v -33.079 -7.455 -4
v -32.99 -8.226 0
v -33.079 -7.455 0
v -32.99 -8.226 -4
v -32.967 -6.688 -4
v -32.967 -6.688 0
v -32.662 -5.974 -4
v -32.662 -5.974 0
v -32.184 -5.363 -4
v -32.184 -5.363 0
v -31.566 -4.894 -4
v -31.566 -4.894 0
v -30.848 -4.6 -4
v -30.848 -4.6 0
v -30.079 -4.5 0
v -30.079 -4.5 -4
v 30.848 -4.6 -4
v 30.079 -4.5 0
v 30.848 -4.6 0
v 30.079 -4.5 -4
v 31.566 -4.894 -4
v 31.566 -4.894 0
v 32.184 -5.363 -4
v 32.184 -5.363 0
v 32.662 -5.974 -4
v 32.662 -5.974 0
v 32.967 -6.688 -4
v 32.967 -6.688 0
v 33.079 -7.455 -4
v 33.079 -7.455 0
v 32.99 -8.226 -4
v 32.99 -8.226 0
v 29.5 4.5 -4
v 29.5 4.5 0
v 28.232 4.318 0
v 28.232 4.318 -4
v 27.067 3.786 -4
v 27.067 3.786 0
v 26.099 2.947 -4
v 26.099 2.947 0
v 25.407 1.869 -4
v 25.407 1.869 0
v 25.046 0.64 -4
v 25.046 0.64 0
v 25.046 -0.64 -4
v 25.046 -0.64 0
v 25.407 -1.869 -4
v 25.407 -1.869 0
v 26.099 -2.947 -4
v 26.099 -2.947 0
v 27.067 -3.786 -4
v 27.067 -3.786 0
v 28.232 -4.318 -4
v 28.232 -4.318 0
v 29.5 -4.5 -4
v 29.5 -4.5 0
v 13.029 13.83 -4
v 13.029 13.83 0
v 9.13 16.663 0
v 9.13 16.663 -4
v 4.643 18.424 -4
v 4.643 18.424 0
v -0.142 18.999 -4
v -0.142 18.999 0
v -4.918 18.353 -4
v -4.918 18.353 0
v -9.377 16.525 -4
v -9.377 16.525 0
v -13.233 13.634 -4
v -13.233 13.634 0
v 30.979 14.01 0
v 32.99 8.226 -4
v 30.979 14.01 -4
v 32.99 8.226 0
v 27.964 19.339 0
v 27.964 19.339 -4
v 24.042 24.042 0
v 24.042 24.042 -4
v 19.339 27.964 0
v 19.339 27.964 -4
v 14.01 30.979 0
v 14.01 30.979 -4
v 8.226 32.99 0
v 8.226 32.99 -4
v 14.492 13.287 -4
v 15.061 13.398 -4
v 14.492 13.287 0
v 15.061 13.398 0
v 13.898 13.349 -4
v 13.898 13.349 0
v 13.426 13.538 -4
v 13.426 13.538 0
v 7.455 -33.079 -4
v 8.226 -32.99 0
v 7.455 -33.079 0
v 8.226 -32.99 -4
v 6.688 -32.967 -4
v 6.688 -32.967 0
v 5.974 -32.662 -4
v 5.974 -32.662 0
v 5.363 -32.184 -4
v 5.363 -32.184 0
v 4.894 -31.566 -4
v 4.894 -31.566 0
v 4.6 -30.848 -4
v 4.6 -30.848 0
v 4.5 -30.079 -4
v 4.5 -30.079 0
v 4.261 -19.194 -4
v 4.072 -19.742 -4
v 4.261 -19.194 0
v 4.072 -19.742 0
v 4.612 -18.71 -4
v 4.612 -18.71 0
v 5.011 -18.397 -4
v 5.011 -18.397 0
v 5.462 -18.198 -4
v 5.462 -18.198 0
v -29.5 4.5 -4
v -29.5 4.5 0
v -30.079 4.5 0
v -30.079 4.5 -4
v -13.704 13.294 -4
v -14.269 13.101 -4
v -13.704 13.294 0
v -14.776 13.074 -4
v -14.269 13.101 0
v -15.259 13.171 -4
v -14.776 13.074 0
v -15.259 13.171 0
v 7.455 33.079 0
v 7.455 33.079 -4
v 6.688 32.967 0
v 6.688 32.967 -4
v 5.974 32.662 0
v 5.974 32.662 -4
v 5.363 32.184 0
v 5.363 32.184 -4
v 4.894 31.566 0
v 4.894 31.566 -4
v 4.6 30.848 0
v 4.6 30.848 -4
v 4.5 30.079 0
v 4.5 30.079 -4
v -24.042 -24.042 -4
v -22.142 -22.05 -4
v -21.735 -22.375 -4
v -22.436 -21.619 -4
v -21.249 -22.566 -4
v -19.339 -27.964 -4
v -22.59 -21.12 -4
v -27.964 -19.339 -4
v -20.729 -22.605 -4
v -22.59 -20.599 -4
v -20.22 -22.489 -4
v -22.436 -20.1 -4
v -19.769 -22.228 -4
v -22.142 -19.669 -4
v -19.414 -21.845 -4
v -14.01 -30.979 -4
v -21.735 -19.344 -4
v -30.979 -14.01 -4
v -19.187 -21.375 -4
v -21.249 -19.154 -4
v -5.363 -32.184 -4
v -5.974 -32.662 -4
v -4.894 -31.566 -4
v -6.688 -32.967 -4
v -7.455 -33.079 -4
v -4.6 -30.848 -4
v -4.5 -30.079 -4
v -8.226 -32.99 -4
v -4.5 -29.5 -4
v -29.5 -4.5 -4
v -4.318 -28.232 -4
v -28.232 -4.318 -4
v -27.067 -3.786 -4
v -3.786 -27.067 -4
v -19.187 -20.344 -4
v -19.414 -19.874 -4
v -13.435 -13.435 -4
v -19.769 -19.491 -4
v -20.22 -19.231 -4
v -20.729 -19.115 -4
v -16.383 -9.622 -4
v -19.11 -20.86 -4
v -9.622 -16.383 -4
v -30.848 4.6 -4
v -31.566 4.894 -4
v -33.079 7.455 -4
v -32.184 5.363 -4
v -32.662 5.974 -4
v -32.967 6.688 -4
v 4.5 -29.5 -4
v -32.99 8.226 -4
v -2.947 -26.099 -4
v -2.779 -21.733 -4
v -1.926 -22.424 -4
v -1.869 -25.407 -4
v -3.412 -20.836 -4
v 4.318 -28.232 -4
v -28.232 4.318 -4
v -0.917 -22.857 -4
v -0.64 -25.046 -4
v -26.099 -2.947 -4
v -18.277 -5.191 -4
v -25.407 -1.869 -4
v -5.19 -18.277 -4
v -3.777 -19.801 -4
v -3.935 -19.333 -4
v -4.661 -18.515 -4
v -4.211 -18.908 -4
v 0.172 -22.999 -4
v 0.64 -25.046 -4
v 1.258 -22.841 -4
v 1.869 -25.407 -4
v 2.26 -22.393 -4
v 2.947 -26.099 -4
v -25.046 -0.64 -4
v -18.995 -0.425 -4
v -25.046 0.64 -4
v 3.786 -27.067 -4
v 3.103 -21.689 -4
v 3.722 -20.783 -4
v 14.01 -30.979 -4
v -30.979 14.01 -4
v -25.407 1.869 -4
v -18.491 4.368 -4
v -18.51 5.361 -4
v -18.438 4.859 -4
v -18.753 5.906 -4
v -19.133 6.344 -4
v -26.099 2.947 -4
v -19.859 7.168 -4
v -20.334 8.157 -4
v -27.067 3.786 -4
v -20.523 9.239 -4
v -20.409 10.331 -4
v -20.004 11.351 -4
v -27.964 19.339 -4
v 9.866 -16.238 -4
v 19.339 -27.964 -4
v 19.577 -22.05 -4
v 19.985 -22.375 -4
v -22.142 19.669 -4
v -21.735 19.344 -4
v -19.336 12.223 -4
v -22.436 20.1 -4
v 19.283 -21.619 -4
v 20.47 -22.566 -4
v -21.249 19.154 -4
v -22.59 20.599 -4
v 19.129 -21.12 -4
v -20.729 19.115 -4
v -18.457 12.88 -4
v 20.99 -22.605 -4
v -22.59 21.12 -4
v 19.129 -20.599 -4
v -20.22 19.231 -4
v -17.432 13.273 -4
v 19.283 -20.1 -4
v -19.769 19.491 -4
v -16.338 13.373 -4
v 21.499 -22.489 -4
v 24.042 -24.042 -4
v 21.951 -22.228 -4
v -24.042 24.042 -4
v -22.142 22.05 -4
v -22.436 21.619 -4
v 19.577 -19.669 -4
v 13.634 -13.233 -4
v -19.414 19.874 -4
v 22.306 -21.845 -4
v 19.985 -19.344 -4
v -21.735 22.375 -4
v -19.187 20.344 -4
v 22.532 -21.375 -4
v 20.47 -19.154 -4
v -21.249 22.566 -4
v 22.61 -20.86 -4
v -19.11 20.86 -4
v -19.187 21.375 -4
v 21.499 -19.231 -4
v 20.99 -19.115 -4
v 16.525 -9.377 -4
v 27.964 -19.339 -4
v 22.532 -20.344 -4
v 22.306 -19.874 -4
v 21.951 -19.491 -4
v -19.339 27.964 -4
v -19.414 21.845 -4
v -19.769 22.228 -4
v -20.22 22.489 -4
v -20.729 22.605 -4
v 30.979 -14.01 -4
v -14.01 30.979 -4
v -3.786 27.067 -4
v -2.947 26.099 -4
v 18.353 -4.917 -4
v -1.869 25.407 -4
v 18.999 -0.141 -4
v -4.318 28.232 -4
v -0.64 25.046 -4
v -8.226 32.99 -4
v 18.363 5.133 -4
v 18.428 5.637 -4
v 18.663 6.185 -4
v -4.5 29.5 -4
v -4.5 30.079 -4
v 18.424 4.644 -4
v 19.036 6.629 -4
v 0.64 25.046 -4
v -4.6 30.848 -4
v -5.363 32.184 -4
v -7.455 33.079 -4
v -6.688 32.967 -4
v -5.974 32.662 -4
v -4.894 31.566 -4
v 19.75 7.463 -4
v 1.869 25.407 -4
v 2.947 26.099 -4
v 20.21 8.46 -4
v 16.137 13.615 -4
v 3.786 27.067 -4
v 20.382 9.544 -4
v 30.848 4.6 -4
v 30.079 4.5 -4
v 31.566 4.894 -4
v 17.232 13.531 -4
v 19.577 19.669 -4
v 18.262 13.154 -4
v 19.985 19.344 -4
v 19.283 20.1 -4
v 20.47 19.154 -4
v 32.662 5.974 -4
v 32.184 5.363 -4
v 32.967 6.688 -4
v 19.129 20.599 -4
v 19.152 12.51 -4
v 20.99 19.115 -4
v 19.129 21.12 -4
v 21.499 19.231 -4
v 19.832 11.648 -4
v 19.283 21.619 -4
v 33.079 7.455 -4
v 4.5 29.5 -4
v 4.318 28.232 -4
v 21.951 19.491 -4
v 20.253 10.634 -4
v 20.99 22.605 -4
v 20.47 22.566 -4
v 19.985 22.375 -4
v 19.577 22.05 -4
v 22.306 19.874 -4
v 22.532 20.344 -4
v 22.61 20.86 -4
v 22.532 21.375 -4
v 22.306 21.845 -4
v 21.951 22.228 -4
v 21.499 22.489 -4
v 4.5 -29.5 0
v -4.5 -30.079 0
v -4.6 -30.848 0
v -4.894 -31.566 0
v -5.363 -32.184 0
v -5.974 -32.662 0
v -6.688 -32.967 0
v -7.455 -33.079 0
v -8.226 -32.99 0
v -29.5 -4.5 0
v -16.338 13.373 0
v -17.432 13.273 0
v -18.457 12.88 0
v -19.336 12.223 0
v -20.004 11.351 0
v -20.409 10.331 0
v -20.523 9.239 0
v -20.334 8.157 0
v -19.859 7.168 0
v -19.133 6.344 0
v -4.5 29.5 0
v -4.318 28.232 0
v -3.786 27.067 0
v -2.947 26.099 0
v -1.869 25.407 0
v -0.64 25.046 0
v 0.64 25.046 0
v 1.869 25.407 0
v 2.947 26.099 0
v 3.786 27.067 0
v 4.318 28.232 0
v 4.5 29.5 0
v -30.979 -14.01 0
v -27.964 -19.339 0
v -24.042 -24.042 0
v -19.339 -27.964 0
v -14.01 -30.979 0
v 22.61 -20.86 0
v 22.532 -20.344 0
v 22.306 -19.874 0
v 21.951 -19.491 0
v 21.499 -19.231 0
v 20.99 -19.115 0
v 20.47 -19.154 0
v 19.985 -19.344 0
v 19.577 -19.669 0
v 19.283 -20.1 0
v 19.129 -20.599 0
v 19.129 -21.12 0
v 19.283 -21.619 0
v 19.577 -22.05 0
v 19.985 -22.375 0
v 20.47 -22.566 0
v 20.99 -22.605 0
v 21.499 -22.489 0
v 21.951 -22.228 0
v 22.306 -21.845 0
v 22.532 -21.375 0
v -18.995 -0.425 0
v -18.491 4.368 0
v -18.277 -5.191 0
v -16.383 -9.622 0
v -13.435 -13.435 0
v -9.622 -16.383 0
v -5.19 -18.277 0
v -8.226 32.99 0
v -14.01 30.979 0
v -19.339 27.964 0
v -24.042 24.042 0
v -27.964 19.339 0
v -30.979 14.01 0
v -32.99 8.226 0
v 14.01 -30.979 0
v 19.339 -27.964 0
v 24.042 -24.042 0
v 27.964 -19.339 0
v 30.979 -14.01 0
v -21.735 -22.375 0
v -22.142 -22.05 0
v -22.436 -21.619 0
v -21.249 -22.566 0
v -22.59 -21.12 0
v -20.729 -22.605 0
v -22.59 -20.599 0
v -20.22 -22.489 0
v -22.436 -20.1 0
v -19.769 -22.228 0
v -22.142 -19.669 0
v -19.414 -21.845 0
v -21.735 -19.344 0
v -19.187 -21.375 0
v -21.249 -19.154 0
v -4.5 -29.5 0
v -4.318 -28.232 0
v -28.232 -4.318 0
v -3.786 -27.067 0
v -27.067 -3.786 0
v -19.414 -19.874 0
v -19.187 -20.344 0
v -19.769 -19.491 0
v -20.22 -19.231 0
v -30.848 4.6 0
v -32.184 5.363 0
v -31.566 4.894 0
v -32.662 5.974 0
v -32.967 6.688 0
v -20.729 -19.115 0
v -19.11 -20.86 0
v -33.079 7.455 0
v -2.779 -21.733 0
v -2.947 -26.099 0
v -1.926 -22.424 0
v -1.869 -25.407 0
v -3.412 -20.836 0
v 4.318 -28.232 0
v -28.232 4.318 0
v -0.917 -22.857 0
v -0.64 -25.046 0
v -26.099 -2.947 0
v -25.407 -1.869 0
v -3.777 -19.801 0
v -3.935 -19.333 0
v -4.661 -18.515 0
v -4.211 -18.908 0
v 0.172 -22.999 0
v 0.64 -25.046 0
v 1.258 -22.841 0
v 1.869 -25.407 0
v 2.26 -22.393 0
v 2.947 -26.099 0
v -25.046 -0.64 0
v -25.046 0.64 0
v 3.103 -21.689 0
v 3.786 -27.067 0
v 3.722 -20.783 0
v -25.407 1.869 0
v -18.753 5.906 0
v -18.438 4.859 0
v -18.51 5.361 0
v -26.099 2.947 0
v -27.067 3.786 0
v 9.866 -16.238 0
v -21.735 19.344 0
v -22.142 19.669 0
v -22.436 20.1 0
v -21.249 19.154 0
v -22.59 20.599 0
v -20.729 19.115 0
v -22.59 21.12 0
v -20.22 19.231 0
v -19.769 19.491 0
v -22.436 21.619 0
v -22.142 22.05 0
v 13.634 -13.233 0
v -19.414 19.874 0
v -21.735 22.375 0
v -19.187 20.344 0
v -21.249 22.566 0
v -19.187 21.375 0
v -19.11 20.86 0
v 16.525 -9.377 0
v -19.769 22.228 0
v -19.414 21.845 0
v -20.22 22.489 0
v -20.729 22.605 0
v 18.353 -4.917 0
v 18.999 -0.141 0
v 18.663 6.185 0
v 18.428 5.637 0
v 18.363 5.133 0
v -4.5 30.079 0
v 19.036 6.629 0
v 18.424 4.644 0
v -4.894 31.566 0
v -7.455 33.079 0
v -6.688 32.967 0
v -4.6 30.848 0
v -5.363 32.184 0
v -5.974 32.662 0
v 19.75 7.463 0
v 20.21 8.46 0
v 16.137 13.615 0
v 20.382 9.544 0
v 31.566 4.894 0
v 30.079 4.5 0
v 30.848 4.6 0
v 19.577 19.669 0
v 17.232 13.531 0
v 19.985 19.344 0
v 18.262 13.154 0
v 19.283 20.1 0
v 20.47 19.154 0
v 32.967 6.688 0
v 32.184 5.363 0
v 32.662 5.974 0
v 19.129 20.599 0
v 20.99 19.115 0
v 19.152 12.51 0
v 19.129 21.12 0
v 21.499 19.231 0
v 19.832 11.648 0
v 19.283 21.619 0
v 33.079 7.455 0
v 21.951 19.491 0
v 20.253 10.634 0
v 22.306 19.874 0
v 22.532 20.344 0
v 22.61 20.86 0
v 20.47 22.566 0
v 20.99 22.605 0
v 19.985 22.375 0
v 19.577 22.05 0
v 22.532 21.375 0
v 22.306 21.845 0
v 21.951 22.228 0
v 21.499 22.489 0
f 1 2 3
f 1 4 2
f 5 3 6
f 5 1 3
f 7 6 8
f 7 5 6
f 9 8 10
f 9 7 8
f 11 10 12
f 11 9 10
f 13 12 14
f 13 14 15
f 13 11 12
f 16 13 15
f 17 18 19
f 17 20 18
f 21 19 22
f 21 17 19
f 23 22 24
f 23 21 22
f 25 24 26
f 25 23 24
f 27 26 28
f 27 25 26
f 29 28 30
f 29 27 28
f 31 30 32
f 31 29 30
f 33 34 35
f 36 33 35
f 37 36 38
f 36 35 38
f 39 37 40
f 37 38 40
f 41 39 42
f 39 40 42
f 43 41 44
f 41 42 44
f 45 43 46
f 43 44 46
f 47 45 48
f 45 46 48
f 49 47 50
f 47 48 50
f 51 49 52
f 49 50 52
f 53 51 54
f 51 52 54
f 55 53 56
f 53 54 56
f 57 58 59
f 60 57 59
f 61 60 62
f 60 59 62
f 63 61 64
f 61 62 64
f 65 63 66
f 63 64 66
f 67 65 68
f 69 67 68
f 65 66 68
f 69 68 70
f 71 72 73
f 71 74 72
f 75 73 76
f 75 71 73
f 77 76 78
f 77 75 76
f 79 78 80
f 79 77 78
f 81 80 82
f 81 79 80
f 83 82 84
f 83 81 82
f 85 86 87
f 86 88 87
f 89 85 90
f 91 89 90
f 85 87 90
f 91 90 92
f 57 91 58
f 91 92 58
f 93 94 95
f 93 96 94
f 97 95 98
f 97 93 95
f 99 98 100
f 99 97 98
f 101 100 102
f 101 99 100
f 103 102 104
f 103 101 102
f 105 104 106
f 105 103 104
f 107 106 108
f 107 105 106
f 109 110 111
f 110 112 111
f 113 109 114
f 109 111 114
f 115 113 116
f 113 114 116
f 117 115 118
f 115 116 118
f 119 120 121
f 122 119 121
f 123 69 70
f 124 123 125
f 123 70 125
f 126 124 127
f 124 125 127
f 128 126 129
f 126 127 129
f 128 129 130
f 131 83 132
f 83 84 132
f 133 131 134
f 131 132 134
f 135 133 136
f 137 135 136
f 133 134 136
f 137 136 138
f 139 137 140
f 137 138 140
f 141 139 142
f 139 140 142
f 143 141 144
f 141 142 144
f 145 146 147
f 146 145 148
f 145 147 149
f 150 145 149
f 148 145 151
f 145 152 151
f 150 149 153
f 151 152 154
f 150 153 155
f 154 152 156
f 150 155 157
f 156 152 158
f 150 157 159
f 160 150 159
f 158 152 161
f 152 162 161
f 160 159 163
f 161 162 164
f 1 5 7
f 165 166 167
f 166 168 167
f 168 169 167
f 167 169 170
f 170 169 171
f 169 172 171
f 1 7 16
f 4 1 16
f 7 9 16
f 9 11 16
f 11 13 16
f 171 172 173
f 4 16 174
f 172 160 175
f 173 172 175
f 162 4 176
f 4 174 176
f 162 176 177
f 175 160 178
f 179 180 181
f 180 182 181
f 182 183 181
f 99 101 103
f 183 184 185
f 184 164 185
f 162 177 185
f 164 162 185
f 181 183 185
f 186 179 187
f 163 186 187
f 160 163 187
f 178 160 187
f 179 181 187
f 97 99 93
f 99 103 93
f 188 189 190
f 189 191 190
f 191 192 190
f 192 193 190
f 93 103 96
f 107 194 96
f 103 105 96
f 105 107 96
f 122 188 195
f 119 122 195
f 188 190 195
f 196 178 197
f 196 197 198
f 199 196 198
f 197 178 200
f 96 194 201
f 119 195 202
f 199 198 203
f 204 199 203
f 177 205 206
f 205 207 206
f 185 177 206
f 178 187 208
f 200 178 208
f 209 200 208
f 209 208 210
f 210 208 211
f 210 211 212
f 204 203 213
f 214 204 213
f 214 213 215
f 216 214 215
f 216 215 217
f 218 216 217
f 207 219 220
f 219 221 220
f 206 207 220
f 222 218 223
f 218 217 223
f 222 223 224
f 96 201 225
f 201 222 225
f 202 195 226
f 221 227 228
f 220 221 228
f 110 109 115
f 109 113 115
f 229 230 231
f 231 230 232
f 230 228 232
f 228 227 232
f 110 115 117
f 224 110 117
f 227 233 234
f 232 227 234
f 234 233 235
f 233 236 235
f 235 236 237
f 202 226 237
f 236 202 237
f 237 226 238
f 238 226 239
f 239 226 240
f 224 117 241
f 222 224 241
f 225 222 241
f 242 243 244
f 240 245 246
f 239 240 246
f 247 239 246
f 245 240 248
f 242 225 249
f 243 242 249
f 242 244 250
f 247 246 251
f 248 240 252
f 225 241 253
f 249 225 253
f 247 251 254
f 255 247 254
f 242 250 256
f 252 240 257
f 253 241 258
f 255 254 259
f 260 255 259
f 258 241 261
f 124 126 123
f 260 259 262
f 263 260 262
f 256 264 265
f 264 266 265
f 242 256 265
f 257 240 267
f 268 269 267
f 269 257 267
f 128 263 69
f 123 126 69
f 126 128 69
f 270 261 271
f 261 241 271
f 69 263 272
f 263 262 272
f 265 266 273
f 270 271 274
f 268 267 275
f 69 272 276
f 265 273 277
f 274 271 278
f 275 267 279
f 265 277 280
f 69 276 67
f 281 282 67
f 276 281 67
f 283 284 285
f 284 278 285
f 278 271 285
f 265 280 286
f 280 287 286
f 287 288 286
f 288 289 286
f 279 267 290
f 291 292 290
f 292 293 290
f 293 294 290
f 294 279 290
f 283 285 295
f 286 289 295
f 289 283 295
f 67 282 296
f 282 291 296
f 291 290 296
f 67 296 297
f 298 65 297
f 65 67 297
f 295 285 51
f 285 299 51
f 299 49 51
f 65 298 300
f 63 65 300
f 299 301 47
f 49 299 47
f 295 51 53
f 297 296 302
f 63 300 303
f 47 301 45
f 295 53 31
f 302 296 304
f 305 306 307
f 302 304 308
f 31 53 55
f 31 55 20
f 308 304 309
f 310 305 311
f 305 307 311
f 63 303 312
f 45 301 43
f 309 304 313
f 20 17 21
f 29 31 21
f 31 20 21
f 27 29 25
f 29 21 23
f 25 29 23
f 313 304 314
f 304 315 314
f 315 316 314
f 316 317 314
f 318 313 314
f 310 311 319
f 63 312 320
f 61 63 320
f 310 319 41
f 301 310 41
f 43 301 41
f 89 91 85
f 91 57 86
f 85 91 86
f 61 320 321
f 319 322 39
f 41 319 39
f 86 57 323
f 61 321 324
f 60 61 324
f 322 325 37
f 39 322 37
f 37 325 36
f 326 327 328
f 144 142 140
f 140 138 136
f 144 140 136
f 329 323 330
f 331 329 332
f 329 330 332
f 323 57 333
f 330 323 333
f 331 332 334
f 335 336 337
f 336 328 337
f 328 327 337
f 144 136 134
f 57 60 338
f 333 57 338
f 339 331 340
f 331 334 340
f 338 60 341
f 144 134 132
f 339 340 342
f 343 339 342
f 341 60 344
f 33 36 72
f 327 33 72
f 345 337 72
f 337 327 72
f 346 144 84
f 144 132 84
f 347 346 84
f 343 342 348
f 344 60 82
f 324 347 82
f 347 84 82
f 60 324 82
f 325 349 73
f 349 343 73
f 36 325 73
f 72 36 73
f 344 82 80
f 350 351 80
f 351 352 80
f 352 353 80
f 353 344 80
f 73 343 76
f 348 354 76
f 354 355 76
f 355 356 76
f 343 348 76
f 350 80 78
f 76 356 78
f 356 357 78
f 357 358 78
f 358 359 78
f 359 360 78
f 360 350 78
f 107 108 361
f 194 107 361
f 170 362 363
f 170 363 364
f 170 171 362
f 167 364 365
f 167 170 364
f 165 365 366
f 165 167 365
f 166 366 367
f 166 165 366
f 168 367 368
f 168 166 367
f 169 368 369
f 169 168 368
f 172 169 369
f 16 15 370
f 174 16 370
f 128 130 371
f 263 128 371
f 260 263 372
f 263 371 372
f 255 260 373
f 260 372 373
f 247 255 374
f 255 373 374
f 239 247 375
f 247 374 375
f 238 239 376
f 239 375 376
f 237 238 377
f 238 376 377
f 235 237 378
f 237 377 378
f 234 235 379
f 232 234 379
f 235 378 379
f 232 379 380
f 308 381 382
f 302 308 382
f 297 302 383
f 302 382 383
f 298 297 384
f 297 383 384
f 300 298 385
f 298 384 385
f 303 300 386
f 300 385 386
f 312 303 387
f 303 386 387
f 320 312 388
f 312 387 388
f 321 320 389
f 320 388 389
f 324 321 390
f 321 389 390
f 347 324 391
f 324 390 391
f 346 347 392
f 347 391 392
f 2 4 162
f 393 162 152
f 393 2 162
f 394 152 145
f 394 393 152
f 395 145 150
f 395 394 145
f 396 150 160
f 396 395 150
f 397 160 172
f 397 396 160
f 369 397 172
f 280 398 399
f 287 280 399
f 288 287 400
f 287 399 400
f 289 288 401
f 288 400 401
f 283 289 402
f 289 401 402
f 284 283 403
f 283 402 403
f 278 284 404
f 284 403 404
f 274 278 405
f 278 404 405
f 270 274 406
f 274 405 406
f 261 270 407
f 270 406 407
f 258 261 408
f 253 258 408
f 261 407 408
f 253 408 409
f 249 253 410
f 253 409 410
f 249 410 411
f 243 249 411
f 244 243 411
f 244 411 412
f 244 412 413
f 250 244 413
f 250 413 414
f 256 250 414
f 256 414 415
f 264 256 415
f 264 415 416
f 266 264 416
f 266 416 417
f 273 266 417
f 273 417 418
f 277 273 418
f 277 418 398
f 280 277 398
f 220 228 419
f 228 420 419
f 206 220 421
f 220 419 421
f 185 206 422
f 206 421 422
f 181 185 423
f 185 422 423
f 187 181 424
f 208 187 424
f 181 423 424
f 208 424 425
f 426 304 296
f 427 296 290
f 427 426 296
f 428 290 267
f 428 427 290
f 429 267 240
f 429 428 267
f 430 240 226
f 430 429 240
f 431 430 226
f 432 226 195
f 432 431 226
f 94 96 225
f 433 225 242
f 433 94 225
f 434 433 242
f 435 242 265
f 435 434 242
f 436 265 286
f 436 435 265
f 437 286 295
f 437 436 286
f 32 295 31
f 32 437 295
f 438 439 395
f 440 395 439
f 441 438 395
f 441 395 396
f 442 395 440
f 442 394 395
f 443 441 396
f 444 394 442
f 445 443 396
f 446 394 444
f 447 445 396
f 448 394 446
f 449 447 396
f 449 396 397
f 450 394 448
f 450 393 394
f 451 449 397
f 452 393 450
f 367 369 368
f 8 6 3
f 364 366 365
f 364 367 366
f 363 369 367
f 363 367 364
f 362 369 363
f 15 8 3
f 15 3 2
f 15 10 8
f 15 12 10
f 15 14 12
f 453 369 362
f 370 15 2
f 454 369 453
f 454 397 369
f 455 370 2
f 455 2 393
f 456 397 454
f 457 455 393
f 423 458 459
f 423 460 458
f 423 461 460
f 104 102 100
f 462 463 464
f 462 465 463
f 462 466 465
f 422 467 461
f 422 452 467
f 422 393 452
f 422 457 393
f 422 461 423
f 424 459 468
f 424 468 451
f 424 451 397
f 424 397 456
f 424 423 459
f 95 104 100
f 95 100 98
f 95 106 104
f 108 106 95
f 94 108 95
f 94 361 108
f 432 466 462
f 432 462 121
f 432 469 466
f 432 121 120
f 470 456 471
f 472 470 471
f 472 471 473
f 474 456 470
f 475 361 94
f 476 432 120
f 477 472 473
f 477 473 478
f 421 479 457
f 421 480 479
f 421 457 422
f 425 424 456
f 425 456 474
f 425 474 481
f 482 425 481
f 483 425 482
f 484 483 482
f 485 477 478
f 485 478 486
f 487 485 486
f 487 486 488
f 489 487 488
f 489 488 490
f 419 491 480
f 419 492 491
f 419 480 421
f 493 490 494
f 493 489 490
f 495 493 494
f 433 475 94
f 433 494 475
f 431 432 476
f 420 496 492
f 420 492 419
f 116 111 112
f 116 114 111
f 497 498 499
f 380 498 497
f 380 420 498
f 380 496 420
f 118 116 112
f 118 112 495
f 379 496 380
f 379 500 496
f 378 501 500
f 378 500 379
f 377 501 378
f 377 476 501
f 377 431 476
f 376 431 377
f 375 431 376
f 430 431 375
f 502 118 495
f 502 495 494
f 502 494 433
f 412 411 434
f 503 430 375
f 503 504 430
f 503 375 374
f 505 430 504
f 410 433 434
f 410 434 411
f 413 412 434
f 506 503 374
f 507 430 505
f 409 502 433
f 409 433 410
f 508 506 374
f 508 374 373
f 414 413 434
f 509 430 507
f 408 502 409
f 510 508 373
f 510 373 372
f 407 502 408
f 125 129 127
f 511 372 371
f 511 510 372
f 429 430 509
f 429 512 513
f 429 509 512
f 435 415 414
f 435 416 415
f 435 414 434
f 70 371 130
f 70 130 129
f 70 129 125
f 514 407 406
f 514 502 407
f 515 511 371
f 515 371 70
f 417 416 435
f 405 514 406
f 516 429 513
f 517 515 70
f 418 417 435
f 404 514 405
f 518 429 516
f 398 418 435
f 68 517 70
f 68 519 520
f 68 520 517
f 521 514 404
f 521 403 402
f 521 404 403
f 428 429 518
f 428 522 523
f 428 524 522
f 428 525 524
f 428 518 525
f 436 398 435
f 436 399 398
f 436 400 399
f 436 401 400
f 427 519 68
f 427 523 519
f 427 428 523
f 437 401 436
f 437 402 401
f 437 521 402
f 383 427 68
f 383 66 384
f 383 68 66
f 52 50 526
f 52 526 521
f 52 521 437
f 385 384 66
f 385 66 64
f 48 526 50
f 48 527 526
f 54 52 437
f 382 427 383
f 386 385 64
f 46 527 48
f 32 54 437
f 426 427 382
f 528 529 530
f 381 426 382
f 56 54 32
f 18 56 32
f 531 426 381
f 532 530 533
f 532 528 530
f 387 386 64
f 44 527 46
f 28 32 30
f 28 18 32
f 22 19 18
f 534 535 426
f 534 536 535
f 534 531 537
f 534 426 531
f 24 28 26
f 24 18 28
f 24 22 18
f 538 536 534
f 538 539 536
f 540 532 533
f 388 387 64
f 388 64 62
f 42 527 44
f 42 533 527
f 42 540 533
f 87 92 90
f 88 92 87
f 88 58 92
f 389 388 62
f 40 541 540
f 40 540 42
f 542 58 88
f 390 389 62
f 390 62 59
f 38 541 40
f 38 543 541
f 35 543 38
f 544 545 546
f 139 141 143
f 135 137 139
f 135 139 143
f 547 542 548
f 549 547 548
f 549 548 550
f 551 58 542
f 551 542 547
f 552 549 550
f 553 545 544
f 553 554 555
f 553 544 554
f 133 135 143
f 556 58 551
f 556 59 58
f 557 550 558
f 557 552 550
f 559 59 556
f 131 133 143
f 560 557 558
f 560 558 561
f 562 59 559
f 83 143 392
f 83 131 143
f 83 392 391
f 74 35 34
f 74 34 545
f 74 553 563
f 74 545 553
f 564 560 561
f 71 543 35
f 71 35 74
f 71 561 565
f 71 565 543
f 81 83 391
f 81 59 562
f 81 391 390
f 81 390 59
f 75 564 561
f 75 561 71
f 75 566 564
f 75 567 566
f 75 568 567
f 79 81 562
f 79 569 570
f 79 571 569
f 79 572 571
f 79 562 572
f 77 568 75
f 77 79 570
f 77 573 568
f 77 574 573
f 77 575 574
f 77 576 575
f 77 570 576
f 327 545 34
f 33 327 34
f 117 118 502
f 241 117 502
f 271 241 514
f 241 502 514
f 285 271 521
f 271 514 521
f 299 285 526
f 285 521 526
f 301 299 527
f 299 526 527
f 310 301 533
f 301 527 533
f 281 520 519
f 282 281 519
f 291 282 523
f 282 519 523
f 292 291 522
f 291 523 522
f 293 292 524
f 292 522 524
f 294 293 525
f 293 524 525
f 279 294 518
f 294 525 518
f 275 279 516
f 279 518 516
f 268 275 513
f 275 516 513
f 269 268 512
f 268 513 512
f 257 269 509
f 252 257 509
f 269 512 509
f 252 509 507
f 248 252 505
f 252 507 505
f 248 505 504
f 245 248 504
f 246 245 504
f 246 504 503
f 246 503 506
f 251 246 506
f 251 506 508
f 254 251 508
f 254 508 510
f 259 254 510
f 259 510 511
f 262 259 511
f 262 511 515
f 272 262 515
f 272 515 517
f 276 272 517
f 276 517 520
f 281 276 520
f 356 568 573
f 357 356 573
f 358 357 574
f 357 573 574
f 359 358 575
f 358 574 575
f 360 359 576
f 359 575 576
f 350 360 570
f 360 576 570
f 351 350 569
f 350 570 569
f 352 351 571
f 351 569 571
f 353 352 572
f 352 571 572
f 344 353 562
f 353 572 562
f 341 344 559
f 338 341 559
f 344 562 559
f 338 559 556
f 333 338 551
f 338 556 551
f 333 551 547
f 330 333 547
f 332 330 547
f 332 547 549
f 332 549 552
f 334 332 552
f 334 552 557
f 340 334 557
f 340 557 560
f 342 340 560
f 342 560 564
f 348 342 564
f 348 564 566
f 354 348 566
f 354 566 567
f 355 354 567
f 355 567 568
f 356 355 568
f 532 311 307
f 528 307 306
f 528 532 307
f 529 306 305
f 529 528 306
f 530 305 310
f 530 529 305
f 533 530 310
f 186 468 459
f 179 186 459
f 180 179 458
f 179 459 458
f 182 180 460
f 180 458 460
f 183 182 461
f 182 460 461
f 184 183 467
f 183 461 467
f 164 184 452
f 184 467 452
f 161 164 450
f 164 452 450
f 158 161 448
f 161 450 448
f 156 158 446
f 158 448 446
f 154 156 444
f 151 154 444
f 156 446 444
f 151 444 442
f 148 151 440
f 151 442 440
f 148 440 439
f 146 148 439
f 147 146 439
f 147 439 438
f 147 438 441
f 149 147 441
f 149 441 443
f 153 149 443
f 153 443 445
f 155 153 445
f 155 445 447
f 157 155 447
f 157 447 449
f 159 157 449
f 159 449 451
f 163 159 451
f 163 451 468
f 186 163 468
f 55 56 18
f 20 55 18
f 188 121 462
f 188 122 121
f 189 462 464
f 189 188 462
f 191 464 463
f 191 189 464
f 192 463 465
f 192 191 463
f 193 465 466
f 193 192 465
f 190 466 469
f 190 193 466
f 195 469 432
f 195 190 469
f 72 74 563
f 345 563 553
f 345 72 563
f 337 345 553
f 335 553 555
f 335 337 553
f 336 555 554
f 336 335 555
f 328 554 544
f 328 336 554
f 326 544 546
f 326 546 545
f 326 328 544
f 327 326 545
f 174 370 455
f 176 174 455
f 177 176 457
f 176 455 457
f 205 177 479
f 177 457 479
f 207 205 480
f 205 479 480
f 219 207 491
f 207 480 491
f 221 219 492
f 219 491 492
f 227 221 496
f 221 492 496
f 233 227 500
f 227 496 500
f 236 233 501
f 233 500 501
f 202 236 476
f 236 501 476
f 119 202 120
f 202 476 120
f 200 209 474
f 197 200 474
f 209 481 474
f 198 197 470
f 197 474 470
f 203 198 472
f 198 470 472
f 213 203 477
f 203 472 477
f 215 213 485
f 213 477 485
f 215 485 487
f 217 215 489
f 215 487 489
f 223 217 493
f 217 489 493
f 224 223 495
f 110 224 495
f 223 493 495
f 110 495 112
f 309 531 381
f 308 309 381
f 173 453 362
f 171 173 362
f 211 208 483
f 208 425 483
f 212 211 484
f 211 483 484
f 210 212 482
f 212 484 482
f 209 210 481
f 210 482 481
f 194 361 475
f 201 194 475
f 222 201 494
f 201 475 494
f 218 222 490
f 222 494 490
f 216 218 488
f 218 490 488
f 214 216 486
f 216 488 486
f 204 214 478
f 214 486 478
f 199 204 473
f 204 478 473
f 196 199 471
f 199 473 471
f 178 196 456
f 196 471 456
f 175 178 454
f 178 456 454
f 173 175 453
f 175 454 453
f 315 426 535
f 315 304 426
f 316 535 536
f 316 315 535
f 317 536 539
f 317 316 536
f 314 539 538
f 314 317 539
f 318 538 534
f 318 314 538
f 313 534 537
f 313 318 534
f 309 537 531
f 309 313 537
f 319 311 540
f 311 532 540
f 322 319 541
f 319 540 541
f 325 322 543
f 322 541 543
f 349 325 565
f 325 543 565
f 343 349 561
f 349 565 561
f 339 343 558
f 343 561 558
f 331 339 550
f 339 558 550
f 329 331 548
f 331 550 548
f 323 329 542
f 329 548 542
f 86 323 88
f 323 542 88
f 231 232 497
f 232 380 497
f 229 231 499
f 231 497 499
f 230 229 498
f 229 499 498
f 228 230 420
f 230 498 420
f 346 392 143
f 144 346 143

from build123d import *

# Parameters (mm, degrees)
SKETCH5_R                = 34
SKETCH5_R_2              = 19
BOSS_EXTRUDE1_DEPTH      = 4
SKETCH8_R                = 1.75
CUT_EXTRUDE3_DEPTH       = 5
SKETCH27_R               = 1.75
CUT_EXTRUDE9_DEPTH       = 5
SKETCH28_R               = 4.5
SKETCH28_R_2             = 1.75
CUT_EXTRUDE10_DEPTH      = 10
FILLET1_R                = 3
CIRPATTERN1_COUNT        = 4
FILLET1_OF_CIRPATTERN1_R = 3
SKETCH32_R               = 4
CUT_EXTRUDE11_DEPTH      = 10
FILLET2_R                = 2


with BuildPart() as part:
    # Sketch5 → Boss-Extrude1 (new body)
    with BuildSketch(Plane.XY):
        Circle(SKETCH5_R)
        Circle(SKETCH5_R_2, mode=Mode.SUBTRACT)
    extrude(amount=-BOSS_EXTRUDE1_DEPTH)

    # Sketch8 → Cut-Extrude3 (cut)
    with BuildSketch(Plane.XY):
        with Locations((20.859650045, 20.859650045)):
            Circle(SKETCH8_R)
        with Locations((-20.859650045, 20.859650045)):
            Circle(SKETCH8_R)
        with Locations((-20.859650045, -20.859650045)):
            Circle(SKETCH8_R)
        with Locations((20.859650045, -20.859650045)):
            Circle(SKETCH8_R)
    extrude(amount=-CUT_EXTRUDE3_DEPTH, mode=Mode.SUBTRACT)

    # Sketch27 → Cut-Extrude9 (cut)
    with BuildSketch(Plane.XY):
        with Locations((0, 29.5)):
            Circle(SKETCH27_R)
        with Locations((29.5, 0)):
            Circle(SKETCH27_R)
        with Locations((0, -29.5)):
            Circle(SKETCH27_R)
        with Locations((-29.5, 0)):
            Circle(SKETCH27_R)
    extrude(amount=-CUT_EXTRUDE9_DEPTH, mode=Mode.SUBTRACT)

    # Sketch28 → Cut-Extrude10 (cut)
    # profile 1 of 4: a face of its own
    with BuildSketch(Plane.XY):
        with BuildLine():
            Line((-4.5, 40.049875312), (-4.5, 33.700890196))
            ThreePointArc((-4.5, 33.700890196), (-2.254964893, 33.925140137), (0, 34))
            ThreePointArc((0, 34), (2.254964893, 33.925140137), (4.5, 33.700890196))
            Line((4.5, 33.700890196), (4.5, 40.049875312))
            Line((4.5, 40.049875312), (-4.5, 40.049875312))
        make_face()
    # profile 2 of 4: a face of its own
    with BuildSketch(Plane.XY):
        with BuildLine():
            Line((-4.5, 33.700890196), (-4.5, 29.5))
            ThreePointArc((-4.5, 29.5), (-3.181980515, 32.681980515), (0, 34))
            ThreePointArc((0, 34), (-2.254964893, 33.925140137), (-4.5, 33.700890196))
        make_face()
    # profile 3 of 4: a face of its own
    with BuildSketch(Plane.XY):
        with BuildLine():
            ThreePointArc((0, 34), (3.181980515, 32.681980515), (4.5, 29.5))
            Line((4.5, 29.5), (4.5, 33.700890196))
            ThreePointArc((4.5, 33.700890196), (2.254964893, 33.925140137), (0, 34))
        make_face()
    # profile 4 of 4: a face of its own
    with BuildSketch(Plane.XY):
        with Locations((0, 29.5)):
            Circle(SKETCH28_R)
        with Locations((0, 29.5)):
            Circle(SKETCH28_R_2, mode=Mode.SUBTRACT)
    cut_extrude10 = extrude(amount=-CUT_EXTRUDE10_DEPTH, mode=Mode.SUBTRACT)

    # Fillet1
    fillet1_edges = [part.edges().sort_by_distance(p)[0] for p in [
        (-4.5, 33.700890196, -2),
        (4.5, 33.700890196, -2),
    ]]
    fillet(fillet1_edges, radius=FILLET1_R)

    # CirPattern1: Cut-Extrude10 ×4 about axis
    cirpattern1_axis = Axis((0, 0, 0), (0, 0, 1))
    for i in range(1, CIRPATTERN1_COUNT):
        add(cut_extrude10.rotate(cirpattern1_axis, i * 360 / CIRPATTERN1_COUNT), mode=Mode.SUBTRACT)

    # Fillet1 of CirPattern1
    fillet1_of_cirpattern1_edges = [part.edges().sort_by_distance(p)[0] for p in [
        (-33.700890196, -4.5, -2),
        (-33.700890196, 4.5, -2),
        (4.5, -33.700890196, -2),
        (-4.5, -33.700890196, -2),
        (33.700890196, 4.5, -2),
        (33.700890196, -4.5, -2),
    ]]
    fillet(fillet1_of_cirpattern1_edges, radius=FILLET1_OF_CIRPATTERN1_R)

    # Sketch32 → Cut-Extrude11 (cut)
    with BuildSketch(Plane.XY):
        with Locations((-16.524893724, 9.376987118)):
            Circle(SKETCH32_R)
        with Locations((16.383155917, 9.622484201)):
            Circle(SKETCH32_R)
        with Locations((0.141737807, -18.999471319)):
            Circle(SKETCH32_R)
    extrude(amount=-CUT_EXTRUDE11_DEPTH, mode=Mode.SUBTRACT)

    # Fillet2
    fillet2_edges = [part.edges().sort_by_distance(p)[0] for p in [
        (-3.83907012, -18.608104165, -2),
        (4.116263726, -18.548756641, -2),
        (18.034625983, 5.979319831, -2),
        (14.005562597, 12.839167276, -2),
        (-14.195555863, 12.628784333, -2),
        (-18.121826323, 5.709589366, -2),
    ]]
    fillet(fillet2_edges, radius=FILLET2_R)


solid = part.part
